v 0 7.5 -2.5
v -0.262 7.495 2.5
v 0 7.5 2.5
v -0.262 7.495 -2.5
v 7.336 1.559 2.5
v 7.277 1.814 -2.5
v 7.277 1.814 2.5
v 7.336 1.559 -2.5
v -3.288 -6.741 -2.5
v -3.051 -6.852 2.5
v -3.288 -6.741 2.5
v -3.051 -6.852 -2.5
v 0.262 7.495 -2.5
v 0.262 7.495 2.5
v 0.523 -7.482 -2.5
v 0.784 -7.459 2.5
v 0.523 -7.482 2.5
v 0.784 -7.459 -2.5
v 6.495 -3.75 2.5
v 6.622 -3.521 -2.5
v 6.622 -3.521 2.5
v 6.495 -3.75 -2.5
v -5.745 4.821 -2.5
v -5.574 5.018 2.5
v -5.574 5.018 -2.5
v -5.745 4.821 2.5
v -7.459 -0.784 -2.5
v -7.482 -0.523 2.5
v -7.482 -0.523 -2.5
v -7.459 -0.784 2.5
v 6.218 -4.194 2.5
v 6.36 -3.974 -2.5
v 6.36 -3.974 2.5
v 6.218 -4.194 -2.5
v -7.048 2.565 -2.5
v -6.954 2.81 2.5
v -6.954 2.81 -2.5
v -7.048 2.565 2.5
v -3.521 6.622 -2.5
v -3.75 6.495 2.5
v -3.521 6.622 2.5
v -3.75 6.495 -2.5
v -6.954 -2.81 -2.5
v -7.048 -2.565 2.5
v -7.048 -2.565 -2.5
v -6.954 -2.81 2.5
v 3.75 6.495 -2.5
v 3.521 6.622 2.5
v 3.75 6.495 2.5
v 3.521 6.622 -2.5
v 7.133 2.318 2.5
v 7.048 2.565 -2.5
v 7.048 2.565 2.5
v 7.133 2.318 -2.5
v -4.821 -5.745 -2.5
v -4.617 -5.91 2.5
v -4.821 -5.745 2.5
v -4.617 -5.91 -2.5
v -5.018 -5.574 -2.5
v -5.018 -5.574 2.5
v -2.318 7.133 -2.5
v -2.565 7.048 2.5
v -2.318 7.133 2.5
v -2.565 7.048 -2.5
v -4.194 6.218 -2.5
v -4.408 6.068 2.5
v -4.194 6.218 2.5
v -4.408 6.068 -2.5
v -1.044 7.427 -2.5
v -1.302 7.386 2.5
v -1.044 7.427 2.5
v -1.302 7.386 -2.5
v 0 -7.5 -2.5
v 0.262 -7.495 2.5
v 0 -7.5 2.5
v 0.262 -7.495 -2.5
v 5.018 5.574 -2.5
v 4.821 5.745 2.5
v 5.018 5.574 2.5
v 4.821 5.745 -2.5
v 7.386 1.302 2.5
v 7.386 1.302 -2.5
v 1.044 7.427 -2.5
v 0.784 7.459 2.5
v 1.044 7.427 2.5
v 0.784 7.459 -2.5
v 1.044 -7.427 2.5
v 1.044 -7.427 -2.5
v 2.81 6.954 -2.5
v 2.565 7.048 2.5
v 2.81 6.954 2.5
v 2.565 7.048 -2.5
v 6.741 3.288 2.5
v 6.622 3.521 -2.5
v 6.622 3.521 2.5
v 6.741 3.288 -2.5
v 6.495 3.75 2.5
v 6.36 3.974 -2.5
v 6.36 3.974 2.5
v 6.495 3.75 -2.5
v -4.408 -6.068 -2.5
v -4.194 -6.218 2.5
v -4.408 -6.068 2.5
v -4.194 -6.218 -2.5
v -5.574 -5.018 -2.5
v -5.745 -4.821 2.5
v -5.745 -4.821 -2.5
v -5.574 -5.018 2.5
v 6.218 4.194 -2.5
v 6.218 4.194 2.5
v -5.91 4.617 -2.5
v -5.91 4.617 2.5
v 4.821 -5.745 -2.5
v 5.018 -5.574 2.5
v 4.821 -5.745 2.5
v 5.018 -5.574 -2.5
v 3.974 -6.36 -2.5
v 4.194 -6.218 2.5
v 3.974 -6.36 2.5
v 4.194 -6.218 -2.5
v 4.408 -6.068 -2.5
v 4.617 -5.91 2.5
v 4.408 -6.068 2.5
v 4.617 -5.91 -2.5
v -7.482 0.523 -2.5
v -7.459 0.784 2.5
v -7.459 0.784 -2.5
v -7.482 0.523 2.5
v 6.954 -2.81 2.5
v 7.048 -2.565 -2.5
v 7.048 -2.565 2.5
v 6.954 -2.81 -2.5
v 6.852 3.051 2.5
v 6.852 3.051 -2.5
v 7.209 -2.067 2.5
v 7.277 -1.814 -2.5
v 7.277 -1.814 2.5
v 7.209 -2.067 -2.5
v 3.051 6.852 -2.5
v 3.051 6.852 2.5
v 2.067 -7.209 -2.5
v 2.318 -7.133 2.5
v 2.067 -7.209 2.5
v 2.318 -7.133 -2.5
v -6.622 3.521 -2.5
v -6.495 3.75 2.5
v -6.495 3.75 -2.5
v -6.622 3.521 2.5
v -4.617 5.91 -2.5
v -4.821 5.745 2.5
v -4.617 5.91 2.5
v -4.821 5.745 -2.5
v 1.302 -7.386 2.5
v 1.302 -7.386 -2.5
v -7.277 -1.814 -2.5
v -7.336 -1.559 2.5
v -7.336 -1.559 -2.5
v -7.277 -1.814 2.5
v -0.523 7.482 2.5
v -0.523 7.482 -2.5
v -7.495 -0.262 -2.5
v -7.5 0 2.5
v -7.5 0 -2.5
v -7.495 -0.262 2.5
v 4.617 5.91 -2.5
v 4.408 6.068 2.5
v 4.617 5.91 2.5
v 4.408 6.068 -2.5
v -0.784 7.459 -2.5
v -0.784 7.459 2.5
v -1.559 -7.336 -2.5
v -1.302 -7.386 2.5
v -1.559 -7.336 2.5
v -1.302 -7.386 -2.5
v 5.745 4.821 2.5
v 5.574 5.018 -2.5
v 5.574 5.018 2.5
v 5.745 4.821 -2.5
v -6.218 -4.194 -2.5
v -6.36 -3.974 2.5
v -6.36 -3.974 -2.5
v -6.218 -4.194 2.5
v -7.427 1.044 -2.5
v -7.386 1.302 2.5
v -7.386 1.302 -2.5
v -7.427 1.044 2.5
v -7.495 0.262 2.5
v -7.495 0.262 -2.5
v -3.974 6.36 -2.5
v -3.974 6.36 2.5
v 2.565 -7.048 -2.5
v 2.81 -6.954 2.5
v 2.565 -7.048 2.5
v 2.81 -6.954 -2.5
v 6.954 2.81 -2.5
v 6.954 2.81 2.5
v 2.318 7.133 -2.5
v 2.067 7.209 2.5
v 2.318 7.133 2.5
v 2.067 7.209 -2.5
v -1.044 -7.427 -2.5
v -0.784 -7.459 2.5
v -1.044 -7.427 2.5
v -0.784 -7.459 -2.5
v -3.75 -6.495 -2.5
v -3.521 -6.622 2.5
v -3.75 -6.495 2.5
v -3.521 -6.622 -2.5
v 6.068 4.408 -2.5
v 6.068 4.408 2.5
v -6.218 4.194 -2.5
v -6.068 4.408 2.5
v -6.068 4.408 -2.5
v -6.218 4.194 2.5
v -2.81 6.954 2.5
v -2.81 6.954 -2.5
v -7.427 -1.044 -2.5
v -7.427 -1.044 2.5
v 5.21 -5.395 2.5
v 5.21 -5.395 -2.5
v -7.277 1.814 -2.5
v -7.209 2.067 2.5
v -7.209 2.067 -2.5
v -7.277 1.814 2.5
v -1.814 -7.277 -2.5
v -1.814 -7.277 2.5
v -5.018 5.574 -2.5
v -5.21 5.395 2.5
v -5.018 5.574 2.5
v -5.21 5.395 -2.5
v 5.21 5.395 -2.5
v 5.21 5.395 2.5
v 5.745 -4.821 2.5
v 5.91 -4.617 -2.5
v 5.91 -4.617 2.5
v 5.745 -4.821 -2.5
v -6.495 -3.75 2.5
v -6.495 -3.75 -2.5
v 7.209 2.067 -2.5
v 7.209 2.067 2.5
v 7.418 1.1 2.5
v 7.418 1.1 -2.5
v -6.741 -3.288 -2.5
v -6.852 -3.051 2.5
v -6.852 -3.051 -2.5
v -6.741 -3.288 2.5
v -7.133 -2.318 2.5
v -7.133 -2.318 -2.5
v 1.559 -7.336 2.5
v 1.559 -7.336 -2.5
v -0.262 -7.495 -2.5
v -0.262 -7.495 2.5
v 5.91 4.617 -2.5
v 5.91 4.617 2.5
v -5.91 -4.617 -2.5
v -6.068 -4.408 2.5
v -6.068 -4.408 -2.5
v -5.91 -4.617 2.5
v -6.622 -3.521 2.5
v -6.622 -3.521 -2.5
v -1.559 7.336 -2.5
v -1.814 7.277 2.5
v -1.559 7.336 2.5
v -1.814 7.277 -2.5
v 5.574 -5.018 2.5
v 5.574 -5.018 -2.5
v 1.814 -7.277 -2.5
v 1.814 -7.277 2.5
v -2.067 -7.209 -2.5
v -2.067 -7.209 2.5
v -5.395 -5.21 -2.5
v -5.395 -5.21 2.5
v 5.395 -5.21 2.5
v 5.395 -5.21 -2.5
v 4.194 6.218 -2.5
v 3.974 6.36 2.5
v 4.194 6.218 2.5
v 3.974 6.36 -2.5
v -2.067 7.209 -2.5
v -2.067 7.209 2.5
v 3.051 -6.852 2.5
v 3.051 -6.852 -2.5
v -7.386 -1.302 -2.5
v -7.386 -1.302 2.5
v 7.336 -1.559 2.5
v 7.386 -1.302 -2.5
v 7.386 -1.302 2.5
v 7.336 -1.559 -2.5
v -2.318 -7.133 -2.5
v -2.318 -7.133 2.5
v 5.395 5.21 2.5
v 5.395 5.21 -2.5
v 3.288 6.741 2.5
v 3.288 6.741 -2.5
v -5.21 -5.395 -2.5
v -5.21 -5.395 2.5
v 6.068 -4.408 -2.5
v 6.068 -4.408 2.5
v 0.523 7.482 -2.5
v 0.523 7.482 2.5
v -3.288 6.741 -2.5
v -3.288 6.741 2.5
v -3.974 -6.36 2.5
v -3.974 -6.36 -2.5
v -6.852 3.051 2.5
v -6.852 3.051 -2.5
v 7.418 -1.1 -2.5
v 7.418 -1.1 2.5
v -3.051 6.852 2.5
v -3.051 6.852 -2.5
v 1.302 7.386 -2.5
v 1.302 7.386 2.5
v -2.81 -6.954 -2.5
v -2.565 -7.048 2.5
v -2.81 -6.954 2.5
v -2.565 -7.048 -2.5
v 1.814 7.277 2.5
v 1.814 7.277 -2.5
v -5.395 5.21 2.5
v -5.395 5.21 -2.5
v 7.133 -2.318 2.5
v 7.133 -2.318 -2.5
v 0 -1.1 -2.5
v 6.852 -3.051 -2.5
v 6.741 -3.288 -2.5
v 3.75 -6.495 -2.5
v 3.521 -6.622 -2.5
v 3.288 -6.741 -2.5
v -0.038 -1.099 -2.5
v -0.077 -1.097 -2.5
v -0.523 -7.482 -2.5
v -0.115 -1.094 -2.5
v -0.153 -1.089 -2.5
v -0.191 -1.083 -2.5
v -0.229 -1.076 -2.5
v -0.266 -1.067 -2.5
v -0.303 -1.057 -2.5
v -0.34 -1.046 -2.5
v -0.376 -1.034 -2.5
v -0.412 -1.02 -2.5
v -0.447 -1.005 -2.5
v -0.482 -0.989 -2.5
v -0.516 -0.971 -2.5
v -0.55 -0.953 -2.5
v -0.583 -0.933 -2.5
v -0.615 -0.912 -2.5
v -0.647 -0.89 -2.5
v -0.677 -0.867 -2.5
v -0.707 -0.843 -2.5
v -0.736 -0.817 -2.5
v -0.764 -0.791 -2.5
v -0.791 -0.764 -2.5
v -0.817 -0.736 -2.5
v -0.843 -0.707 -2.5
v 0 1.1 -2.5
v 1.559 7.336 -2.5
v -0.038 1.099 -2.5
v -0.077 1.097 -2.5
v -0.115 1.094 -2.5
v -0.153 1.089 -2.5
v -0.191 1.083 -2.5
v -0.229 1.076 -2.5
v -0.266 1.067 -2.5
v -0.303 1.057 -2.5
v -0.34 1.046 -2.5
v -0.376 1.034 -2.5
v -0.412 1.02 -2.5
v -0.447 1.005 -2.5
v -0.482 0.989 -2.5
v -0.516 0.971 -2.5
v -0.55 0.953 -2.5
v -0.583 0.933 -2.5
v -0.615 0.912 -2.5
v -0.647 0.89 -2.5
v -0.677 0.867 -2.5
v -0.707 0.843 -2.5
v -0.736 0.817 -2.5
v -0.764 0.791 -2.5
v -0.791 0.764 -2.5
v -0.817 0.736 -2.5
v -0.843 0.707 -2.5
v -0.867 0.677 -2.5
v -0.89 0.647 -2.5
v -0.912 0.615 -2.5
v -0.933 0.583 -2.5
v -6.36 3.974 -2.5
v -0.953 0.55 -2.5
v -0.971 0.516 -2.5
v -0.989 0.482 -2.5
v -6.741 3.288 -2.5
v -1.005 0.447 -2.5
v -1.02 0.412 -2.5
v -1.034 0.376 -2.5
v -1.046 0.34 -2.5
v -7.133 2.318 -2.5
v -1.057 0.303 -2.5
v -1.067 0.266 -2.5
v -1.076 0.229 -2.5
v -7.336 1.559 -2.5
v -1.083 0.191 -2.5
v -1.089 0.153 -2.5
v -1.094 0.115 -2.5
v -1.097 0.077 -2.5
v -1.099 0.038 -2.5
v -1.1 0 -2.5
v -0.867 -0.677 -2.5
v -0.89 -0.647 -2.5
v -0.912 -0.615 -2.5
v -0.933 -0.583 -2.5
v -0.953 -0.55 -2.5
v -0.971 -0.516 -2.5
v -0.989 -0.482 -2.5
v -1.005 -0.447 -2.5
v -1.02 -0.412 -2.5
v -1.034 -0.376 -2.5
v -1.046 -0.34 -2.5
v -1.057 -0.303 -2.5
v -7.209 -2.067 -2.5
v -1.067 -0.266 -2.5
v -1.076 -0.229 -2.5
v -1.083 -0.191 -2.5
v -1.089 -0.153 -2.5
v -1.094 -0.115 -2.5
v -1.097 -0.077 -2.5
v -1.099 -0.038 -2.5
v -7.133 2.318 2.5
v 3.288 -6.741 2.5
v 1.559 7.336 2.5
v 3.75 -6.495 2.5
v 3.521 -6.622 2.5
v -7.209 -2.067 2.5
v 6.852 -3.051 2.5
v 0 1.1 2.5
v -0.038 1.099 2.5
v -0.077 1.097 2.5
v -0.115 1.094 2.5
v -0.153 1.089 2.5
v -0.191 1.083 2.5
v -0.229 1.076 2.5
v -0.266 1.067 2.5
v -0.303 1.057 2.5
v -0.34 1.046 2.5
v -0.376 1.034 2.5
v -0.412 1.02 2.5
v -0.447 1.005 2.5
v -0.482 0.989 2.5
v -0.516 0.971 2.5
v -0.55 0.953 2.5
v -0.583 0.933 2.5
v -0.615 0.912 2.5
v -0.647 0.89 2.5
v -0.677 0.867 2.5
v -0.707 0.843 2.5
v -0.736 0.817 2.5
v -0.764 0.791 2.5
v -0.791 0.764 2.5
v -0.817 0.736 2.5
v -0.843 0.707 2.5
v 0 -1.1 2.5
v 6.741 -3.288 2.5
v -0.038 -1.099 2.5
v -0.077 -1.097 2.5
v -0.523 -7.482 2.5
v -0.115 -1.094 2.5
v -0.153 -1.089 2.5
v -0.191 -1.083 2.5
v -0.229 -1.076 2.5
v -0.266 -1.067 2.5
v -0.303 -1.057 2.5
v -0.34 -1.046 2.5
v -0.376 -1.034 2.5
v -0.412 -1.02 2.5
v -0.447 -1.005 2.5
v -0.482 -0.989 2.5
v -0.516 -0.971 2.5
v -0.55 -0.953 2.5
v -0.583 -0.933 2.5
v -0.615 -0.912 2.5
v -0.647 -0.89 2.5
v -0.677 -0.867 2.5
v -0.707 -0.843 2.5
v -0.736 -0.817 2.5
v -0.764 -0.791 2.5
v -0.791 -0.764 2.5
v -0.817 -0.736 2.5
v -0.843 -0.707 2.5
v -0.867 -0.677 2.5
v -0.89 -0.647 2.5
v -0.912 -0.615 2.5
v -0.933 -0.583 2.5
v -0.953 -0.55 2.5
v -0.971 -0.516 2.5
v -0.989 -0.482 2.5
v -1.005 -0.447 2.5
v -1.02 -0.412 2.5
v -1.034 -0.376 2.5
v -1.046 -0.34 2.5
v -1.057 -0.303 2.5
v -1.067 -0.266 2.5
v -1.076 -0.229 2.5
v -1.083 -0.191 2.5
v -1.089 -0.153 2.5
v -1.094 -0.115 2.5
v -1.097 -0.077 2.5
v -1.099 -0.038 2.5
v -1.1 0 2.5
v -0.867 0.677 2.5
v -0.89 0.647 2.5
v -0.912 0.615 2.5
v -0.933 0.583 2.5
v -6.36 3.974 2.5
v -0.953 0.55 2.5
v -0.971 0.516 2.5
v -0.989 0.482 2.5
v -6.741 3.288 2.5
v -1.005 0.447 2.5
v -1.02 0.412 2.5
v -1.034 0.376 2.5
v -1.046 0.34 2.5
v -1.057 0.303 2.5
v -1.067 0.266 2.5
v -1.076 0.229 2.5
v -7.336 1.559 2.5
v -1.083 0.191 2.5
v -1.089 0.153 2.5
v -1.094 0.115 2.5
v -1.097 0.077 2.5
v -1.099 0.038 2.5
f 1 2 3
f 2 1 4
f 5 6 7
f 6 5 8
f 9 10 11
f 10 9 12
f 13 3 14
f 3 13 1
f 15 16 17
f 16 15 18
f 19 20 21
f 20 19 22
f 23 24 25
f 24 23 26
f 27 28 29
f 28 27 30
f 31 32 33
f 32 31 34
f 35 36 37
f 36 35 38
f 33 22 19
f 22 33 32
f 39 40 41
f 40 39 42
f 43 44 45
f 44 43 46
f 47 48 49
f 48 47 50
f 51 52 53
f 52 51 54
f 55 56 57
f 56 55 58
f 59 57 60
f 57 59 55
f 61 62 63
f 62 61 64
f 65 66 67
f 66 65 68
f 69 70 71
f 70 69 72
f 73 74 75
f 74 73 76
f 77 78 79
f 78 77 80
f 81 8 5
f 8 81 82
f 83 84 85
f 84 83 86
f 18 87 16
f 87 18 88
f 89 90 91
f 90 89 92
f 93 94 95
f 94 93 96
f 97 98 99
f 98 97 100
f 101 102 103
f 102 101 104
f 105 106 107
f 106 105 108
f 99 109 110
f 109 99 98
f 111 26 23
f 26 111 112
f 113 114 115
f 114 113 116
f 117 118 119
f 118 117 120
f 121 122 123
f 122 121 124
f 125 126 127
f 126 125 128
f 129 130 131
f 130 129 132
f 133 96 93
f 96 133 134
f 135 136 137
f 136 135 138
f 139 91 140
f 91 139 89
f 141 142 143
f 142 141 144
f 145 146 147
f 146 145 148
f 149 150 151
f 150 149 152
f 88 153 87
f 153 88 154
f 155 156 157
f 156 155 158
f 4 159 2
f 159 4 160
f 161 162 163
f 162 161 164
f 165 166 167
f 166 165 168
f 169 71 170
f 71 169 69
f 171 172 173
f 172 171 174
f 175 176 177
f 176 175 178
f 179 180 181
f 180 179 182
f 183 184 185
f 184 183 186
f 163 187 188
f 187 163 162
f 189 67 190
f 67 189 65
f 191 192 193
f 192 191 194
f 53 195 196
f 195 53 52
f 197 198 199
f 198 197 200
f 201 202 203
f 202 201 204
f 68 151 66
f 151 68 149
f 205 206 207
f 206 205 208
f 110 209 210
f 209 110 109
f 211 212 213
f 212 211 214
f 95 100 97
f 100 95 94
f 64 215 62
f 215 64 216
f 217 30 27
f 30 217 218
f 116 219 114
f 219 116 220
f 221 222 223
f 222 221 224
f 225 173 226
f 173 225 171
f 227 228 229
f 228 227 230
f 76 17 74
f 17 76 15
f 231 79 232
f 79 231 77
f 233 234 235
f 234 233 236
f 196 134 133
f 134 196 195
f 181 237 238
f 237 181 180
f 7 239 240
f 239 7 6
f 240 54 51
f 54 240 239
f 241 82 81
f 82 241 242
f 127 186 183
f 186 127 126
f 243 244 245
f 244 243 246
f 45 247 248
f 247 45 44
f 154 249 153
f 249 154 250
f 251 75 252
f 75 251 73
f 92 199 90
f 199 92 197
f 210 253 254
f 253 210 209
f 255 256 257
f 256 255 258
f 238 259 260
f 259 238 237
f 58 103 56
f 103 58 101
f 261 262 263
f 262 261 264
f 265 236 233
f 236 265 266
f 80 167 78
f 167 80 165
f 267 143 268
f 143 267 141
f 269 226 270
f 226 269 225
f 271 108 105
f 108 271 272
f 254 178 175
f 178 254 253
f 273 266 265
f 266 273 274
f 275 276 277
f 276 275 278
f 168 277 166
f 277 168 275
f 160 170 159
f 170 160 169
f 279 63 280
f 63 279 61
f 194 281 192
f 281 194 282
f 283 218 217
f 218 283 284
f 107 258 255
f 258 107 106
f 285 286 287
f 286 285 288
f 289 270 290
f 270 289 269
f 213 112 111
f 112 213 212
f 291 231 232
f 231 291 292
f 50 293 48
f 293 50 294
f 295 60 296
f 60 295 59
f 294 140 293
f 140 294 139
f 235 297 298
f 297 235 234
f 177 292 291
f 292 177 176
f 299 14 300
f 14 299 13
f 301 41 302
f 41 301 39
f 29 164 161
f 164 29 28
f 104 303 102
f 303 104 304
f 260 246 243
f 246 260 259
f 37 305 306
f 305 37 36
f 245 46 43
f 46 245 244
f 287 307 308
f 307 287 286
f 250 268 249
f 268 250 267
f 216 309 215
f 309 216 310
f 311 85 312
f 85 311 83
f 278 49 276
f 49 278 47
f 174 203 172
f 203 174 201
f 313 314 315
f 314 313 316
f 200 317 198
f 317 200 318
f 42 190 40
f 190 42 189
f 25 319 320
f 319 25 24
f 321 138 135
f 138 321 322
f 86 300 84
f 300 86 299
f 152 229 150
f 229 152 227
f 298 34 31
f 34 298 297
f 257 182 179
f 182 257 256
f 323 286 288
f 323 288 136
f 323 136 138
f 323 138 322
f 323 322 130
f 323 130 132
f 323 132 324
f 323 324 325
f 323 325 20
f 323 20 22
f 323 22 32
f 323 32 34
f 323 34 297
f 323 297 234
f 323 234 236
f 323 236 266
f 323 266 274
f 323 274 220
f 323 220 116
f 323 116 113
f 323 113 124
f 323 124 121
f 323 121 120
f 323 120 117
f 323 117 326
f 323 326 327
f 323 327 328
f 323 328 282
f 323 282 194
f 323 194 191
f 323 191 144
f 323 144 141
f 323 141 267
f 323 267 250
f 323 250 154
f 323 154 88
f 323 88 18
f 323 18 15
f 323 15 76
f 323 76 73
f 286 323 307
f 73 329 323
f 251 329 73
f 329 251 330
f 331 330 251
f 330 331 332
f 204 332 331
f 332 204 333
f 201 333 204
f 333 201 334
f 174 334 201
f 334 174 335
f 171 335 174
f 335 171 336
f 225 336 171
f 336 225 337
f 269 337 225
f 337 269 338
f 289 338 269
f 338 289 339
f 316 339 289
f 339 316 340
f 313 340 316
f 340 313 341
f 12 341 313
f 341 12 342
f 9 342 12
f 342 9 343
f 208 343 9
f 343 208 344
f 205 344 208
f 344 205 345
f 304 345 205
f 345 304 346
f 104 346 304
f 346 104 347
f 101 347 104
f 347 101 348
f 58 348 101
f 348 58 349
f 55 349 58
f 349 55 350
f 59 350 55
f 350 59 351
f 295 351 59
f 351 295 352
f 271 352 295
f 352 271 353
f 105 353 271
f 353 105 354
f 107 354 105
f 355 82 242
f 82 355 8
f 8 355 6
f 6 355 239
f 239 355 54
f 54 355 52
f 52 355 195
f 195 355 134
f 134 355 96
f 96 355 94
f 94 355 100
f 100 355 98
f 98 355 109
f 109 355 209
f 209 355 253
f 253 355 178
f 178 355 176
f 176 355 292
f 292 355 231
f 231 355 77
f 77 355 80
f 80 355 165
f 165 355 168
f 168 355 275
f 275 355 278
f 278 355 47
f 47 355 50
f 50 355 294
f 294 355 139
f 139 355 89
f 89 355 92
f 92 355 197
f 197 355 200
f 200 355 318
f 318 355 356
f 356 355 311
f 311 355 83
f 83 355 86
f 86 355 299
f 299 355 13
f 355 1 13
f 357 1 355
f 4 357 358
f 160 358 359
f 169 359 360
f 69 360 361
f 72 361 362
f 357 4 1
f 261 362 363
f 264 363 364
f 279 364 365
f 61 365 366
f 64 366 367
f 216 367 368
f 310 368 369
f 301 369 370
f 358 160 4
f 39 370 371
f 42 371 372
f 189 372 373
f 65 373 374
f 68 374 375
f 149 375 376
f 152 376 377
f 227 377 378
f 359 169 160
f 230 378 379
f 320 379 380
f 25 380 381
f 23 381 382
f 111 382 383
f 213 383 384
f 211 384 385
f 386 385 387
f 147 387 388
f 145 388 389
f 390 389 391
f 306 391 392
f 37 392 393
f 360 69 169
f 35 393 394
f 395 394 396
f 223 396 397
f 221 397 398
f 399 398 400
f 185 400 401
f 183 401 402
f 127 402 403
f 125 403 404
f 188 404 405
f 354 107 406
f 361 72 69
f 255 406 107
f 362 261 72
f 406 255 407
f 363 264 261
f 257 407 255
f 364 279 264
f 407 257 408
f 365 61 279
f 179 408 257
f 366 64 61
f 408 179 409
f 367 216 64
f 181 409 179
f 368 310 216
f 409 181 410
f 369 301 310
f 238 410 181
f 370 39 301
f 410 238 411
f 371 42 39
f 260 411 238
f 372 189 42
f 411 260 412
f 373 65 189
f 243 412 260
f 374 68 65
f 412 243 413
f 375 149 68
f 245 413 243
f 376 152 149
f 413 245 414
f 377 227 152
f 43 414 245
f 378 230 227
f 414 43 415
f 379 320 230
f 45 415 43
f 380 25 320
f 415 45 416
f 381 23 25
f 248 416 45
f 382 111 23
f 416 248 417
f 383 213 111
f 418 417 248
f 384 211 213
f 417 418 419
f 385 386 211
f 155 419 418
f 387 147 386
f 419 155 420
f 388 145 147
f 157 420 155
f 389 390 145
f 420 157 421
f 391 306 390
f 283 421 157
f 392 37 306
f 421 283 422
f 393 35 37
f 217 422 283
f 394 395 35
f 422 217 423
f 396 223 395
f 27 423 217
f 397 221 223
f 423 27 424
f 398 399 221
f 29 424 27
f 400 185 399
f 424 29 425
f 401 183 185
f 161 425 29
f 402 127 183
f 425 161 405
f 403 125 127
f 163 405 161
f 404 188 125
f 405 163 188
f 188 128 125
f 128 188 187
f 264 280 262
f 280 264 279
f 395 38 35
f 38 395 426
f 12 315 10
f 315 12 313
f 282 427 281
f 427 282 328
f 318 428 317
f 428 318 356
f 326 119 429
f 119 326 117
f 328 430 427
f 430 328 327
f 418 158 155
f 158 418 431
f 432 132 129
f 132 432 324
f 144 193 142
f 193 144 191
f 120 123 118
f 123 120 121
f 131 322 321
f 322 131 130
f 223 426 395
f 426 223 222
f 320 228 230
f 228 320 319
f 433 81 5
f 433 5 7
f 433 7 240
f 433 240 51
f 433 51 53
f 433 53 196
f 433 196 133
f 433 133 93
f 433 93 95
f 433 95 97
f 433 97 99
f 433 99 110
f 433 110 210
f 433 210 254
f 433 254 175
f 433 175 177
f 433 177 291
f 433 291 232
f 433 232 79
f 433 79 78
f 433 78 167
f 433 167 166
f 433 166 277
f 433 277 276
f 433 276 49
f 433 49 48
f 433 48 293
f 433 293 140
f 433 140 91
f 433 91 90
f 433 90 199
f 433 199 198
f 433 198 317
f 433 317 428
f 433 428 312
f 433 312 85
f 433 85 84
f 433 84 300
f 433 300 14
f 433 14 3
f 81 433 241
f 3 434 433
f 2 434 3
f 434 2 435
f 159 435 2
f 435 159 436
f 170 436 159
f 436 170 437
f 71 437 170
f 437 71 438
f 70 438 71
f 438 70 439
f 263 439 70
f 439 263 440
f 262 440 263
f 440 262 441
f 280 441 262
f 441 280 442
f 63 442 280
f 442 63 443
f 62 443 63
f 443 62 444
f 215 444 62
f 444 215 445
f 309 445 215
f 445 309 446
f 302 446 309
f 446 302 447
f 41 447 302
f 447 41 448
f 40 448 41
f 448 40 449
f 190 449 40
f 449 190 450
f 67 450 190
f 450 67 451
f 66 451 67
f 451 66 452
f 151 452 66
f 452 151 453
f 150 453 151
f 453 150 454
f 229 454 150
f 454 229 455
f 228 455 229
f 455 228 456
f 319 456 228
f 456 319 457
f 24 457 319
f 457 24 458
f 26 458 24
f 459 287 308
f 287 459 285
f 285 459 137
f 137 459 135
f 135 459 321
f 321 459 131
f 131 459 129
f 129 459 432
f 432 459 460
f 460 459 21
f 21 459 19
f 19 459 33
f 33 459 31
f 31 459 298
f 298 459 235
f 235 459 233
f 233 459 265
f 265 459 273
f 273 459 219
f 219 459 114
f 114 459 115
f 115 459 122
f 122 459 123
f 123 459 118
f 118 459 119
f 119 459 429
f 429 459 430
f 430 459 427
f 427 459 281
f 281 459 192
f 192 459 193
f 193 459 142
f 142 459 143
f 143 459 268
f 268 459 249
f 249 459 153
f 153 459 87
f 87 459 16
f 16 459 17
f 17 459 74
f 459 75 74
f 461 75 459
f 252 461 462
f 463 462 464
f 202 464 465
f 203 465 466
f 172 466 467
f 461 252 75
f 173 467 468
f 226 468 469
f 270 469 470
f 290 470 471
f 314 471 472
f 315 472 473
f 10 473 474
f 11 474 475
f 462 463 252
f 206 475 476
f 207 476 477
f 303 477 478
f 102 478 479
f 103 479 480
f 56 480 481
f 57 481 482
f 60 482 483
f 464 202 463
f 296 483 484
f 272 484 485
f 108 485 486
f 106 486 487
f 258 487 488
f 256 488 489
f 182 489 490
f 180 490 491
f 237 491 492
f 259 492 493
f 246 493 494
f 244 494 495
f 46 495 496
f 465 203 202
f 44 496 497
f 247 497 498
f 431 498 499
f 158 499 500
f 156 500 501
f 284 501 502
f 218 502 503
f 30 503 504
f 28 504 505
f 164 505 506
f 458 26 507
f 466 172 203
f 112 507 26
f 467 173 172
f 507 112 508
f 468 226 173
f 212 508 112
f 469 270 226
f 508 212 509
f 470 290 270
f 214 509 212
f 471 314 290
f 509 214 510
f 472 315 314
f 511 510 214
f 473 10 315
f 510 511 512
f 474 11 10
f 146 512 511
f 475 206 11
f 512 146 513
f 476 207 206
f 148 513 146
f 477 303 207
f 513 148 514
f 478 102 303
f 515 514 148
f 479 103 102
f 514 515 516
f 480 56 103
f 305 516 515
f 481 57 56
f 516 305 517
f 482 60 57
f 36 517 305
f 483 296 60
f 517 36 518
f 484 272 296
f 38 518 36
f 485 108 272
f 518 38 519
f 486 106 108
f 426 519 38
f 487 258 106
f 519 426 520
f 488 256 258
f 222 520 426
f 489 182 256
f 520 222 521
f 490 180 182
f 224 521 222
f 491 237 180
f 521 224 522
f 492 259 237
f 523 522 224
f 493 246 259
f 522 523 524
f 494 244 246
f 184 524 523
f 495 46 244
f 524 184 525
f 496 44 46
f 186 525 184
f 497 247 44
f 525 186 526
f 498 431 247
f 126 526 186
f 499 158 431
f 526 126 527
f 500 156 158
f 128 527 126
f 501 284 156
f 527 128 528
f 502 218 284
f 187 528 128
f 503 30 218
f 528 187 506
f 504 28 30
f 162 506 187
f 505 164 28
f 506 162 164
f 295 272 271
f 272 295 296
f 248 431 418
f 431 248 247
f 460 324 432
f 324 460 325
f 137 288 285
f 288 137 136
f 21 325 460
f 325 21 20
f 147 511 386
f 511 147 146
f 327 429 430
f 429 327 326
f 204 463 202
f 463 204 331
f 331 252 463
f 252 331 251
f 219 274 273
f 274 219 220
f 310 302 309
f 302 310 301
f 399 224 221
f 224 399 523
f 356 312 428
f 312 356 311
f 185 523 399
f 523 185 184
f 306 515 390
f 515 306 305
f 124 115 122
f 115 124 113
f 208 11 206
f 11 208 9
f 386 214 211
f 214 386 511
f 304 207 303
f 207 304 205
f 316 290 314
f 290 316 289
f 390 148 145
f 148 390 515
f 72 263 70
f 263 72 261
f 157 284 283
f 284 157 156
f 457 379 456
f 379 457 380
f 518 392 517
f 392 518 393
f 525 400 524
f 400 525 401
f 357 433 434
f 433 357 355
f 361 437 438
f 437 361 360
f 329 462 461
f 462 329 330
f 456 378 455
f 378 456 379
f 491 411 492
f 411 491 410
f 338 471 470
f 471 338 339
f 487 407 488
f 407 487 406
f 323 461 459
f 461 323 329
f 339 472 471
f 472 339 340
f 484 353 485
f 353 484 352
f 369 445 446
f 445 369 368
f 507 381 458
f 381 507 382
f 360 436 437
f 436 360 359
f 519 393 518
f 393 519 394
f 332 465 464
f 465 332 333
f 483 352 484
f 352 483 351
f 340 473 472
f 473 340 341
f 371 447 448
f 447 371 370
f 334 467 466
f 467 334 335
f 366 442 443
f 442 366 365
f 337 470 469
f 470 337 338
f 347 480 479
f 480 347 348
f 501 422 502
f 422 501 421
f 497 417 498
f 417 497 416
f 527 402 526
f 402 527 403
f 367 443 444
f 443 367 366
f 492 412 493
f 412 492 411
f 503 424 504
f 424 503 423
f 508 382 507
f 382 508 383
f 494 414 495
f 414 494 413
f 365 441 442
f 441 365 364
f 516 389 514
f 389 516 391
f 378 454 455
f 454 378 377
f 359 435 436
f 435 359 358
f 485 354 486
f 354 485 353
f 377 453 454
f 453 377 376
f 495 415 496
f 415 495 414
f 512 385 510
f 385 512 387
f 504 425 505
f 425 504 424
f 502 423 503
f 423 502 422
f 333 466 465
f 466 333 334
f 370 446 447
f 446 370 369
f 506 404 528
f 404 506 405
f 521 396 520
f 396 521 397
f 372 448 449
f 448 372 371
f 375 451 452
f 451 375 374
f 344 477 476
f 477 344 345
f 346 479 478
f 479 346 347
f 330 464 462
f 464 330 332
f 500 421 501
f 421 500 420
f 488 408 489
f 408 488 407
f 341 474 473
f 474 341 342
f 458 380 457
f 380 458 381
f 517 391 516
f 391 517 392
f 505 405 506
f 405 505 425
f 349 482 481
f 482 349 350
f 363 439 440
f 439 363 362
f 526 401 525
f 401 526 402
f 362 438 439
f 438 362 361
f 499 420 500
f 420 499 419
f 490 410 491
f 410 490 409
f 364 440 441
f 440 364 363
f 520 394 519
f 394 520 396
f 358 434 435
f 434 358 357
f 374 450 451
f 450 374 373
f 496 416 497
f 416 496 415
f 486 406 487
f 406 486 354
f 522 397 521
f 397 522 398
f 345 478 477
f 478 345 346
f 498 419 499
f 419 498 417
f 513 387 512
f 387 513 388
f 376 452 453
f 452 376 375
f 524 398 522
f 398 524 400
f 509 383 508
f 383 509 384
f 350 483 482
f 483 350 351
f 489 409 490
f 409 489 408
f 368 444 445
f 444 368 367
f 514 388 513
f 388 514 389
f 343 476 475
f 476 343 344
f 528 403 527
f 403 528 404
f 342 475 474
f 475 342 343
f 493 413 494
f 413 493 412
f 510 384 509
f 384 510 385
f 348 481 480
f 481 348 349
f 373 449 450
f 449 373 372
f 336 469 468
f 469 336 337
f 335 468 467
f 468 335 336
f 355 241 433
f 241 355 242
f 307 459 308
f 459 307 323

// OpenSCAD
//cube([120,120,3], center = true);
//translate([-45,-45,0])cylinder(h = 3, r=15, $fn = 180, center = true);
//rotate_extrude(convexity = 10, $fn = A) translate([20+1.5, 0, 0])circle(d = 3, $fn = B);


difference(){
    
translate([0,0,0])cylinder(h = 5, d=15, $fn = 180, center = true);

translate([0,0,0])cylinder(h = 10, d=2.2, $fn = 180, center = true);
    
    
translate([7.5,0,0]) cube([15,2.2,15], center = true);    
    

    
    


}



 
